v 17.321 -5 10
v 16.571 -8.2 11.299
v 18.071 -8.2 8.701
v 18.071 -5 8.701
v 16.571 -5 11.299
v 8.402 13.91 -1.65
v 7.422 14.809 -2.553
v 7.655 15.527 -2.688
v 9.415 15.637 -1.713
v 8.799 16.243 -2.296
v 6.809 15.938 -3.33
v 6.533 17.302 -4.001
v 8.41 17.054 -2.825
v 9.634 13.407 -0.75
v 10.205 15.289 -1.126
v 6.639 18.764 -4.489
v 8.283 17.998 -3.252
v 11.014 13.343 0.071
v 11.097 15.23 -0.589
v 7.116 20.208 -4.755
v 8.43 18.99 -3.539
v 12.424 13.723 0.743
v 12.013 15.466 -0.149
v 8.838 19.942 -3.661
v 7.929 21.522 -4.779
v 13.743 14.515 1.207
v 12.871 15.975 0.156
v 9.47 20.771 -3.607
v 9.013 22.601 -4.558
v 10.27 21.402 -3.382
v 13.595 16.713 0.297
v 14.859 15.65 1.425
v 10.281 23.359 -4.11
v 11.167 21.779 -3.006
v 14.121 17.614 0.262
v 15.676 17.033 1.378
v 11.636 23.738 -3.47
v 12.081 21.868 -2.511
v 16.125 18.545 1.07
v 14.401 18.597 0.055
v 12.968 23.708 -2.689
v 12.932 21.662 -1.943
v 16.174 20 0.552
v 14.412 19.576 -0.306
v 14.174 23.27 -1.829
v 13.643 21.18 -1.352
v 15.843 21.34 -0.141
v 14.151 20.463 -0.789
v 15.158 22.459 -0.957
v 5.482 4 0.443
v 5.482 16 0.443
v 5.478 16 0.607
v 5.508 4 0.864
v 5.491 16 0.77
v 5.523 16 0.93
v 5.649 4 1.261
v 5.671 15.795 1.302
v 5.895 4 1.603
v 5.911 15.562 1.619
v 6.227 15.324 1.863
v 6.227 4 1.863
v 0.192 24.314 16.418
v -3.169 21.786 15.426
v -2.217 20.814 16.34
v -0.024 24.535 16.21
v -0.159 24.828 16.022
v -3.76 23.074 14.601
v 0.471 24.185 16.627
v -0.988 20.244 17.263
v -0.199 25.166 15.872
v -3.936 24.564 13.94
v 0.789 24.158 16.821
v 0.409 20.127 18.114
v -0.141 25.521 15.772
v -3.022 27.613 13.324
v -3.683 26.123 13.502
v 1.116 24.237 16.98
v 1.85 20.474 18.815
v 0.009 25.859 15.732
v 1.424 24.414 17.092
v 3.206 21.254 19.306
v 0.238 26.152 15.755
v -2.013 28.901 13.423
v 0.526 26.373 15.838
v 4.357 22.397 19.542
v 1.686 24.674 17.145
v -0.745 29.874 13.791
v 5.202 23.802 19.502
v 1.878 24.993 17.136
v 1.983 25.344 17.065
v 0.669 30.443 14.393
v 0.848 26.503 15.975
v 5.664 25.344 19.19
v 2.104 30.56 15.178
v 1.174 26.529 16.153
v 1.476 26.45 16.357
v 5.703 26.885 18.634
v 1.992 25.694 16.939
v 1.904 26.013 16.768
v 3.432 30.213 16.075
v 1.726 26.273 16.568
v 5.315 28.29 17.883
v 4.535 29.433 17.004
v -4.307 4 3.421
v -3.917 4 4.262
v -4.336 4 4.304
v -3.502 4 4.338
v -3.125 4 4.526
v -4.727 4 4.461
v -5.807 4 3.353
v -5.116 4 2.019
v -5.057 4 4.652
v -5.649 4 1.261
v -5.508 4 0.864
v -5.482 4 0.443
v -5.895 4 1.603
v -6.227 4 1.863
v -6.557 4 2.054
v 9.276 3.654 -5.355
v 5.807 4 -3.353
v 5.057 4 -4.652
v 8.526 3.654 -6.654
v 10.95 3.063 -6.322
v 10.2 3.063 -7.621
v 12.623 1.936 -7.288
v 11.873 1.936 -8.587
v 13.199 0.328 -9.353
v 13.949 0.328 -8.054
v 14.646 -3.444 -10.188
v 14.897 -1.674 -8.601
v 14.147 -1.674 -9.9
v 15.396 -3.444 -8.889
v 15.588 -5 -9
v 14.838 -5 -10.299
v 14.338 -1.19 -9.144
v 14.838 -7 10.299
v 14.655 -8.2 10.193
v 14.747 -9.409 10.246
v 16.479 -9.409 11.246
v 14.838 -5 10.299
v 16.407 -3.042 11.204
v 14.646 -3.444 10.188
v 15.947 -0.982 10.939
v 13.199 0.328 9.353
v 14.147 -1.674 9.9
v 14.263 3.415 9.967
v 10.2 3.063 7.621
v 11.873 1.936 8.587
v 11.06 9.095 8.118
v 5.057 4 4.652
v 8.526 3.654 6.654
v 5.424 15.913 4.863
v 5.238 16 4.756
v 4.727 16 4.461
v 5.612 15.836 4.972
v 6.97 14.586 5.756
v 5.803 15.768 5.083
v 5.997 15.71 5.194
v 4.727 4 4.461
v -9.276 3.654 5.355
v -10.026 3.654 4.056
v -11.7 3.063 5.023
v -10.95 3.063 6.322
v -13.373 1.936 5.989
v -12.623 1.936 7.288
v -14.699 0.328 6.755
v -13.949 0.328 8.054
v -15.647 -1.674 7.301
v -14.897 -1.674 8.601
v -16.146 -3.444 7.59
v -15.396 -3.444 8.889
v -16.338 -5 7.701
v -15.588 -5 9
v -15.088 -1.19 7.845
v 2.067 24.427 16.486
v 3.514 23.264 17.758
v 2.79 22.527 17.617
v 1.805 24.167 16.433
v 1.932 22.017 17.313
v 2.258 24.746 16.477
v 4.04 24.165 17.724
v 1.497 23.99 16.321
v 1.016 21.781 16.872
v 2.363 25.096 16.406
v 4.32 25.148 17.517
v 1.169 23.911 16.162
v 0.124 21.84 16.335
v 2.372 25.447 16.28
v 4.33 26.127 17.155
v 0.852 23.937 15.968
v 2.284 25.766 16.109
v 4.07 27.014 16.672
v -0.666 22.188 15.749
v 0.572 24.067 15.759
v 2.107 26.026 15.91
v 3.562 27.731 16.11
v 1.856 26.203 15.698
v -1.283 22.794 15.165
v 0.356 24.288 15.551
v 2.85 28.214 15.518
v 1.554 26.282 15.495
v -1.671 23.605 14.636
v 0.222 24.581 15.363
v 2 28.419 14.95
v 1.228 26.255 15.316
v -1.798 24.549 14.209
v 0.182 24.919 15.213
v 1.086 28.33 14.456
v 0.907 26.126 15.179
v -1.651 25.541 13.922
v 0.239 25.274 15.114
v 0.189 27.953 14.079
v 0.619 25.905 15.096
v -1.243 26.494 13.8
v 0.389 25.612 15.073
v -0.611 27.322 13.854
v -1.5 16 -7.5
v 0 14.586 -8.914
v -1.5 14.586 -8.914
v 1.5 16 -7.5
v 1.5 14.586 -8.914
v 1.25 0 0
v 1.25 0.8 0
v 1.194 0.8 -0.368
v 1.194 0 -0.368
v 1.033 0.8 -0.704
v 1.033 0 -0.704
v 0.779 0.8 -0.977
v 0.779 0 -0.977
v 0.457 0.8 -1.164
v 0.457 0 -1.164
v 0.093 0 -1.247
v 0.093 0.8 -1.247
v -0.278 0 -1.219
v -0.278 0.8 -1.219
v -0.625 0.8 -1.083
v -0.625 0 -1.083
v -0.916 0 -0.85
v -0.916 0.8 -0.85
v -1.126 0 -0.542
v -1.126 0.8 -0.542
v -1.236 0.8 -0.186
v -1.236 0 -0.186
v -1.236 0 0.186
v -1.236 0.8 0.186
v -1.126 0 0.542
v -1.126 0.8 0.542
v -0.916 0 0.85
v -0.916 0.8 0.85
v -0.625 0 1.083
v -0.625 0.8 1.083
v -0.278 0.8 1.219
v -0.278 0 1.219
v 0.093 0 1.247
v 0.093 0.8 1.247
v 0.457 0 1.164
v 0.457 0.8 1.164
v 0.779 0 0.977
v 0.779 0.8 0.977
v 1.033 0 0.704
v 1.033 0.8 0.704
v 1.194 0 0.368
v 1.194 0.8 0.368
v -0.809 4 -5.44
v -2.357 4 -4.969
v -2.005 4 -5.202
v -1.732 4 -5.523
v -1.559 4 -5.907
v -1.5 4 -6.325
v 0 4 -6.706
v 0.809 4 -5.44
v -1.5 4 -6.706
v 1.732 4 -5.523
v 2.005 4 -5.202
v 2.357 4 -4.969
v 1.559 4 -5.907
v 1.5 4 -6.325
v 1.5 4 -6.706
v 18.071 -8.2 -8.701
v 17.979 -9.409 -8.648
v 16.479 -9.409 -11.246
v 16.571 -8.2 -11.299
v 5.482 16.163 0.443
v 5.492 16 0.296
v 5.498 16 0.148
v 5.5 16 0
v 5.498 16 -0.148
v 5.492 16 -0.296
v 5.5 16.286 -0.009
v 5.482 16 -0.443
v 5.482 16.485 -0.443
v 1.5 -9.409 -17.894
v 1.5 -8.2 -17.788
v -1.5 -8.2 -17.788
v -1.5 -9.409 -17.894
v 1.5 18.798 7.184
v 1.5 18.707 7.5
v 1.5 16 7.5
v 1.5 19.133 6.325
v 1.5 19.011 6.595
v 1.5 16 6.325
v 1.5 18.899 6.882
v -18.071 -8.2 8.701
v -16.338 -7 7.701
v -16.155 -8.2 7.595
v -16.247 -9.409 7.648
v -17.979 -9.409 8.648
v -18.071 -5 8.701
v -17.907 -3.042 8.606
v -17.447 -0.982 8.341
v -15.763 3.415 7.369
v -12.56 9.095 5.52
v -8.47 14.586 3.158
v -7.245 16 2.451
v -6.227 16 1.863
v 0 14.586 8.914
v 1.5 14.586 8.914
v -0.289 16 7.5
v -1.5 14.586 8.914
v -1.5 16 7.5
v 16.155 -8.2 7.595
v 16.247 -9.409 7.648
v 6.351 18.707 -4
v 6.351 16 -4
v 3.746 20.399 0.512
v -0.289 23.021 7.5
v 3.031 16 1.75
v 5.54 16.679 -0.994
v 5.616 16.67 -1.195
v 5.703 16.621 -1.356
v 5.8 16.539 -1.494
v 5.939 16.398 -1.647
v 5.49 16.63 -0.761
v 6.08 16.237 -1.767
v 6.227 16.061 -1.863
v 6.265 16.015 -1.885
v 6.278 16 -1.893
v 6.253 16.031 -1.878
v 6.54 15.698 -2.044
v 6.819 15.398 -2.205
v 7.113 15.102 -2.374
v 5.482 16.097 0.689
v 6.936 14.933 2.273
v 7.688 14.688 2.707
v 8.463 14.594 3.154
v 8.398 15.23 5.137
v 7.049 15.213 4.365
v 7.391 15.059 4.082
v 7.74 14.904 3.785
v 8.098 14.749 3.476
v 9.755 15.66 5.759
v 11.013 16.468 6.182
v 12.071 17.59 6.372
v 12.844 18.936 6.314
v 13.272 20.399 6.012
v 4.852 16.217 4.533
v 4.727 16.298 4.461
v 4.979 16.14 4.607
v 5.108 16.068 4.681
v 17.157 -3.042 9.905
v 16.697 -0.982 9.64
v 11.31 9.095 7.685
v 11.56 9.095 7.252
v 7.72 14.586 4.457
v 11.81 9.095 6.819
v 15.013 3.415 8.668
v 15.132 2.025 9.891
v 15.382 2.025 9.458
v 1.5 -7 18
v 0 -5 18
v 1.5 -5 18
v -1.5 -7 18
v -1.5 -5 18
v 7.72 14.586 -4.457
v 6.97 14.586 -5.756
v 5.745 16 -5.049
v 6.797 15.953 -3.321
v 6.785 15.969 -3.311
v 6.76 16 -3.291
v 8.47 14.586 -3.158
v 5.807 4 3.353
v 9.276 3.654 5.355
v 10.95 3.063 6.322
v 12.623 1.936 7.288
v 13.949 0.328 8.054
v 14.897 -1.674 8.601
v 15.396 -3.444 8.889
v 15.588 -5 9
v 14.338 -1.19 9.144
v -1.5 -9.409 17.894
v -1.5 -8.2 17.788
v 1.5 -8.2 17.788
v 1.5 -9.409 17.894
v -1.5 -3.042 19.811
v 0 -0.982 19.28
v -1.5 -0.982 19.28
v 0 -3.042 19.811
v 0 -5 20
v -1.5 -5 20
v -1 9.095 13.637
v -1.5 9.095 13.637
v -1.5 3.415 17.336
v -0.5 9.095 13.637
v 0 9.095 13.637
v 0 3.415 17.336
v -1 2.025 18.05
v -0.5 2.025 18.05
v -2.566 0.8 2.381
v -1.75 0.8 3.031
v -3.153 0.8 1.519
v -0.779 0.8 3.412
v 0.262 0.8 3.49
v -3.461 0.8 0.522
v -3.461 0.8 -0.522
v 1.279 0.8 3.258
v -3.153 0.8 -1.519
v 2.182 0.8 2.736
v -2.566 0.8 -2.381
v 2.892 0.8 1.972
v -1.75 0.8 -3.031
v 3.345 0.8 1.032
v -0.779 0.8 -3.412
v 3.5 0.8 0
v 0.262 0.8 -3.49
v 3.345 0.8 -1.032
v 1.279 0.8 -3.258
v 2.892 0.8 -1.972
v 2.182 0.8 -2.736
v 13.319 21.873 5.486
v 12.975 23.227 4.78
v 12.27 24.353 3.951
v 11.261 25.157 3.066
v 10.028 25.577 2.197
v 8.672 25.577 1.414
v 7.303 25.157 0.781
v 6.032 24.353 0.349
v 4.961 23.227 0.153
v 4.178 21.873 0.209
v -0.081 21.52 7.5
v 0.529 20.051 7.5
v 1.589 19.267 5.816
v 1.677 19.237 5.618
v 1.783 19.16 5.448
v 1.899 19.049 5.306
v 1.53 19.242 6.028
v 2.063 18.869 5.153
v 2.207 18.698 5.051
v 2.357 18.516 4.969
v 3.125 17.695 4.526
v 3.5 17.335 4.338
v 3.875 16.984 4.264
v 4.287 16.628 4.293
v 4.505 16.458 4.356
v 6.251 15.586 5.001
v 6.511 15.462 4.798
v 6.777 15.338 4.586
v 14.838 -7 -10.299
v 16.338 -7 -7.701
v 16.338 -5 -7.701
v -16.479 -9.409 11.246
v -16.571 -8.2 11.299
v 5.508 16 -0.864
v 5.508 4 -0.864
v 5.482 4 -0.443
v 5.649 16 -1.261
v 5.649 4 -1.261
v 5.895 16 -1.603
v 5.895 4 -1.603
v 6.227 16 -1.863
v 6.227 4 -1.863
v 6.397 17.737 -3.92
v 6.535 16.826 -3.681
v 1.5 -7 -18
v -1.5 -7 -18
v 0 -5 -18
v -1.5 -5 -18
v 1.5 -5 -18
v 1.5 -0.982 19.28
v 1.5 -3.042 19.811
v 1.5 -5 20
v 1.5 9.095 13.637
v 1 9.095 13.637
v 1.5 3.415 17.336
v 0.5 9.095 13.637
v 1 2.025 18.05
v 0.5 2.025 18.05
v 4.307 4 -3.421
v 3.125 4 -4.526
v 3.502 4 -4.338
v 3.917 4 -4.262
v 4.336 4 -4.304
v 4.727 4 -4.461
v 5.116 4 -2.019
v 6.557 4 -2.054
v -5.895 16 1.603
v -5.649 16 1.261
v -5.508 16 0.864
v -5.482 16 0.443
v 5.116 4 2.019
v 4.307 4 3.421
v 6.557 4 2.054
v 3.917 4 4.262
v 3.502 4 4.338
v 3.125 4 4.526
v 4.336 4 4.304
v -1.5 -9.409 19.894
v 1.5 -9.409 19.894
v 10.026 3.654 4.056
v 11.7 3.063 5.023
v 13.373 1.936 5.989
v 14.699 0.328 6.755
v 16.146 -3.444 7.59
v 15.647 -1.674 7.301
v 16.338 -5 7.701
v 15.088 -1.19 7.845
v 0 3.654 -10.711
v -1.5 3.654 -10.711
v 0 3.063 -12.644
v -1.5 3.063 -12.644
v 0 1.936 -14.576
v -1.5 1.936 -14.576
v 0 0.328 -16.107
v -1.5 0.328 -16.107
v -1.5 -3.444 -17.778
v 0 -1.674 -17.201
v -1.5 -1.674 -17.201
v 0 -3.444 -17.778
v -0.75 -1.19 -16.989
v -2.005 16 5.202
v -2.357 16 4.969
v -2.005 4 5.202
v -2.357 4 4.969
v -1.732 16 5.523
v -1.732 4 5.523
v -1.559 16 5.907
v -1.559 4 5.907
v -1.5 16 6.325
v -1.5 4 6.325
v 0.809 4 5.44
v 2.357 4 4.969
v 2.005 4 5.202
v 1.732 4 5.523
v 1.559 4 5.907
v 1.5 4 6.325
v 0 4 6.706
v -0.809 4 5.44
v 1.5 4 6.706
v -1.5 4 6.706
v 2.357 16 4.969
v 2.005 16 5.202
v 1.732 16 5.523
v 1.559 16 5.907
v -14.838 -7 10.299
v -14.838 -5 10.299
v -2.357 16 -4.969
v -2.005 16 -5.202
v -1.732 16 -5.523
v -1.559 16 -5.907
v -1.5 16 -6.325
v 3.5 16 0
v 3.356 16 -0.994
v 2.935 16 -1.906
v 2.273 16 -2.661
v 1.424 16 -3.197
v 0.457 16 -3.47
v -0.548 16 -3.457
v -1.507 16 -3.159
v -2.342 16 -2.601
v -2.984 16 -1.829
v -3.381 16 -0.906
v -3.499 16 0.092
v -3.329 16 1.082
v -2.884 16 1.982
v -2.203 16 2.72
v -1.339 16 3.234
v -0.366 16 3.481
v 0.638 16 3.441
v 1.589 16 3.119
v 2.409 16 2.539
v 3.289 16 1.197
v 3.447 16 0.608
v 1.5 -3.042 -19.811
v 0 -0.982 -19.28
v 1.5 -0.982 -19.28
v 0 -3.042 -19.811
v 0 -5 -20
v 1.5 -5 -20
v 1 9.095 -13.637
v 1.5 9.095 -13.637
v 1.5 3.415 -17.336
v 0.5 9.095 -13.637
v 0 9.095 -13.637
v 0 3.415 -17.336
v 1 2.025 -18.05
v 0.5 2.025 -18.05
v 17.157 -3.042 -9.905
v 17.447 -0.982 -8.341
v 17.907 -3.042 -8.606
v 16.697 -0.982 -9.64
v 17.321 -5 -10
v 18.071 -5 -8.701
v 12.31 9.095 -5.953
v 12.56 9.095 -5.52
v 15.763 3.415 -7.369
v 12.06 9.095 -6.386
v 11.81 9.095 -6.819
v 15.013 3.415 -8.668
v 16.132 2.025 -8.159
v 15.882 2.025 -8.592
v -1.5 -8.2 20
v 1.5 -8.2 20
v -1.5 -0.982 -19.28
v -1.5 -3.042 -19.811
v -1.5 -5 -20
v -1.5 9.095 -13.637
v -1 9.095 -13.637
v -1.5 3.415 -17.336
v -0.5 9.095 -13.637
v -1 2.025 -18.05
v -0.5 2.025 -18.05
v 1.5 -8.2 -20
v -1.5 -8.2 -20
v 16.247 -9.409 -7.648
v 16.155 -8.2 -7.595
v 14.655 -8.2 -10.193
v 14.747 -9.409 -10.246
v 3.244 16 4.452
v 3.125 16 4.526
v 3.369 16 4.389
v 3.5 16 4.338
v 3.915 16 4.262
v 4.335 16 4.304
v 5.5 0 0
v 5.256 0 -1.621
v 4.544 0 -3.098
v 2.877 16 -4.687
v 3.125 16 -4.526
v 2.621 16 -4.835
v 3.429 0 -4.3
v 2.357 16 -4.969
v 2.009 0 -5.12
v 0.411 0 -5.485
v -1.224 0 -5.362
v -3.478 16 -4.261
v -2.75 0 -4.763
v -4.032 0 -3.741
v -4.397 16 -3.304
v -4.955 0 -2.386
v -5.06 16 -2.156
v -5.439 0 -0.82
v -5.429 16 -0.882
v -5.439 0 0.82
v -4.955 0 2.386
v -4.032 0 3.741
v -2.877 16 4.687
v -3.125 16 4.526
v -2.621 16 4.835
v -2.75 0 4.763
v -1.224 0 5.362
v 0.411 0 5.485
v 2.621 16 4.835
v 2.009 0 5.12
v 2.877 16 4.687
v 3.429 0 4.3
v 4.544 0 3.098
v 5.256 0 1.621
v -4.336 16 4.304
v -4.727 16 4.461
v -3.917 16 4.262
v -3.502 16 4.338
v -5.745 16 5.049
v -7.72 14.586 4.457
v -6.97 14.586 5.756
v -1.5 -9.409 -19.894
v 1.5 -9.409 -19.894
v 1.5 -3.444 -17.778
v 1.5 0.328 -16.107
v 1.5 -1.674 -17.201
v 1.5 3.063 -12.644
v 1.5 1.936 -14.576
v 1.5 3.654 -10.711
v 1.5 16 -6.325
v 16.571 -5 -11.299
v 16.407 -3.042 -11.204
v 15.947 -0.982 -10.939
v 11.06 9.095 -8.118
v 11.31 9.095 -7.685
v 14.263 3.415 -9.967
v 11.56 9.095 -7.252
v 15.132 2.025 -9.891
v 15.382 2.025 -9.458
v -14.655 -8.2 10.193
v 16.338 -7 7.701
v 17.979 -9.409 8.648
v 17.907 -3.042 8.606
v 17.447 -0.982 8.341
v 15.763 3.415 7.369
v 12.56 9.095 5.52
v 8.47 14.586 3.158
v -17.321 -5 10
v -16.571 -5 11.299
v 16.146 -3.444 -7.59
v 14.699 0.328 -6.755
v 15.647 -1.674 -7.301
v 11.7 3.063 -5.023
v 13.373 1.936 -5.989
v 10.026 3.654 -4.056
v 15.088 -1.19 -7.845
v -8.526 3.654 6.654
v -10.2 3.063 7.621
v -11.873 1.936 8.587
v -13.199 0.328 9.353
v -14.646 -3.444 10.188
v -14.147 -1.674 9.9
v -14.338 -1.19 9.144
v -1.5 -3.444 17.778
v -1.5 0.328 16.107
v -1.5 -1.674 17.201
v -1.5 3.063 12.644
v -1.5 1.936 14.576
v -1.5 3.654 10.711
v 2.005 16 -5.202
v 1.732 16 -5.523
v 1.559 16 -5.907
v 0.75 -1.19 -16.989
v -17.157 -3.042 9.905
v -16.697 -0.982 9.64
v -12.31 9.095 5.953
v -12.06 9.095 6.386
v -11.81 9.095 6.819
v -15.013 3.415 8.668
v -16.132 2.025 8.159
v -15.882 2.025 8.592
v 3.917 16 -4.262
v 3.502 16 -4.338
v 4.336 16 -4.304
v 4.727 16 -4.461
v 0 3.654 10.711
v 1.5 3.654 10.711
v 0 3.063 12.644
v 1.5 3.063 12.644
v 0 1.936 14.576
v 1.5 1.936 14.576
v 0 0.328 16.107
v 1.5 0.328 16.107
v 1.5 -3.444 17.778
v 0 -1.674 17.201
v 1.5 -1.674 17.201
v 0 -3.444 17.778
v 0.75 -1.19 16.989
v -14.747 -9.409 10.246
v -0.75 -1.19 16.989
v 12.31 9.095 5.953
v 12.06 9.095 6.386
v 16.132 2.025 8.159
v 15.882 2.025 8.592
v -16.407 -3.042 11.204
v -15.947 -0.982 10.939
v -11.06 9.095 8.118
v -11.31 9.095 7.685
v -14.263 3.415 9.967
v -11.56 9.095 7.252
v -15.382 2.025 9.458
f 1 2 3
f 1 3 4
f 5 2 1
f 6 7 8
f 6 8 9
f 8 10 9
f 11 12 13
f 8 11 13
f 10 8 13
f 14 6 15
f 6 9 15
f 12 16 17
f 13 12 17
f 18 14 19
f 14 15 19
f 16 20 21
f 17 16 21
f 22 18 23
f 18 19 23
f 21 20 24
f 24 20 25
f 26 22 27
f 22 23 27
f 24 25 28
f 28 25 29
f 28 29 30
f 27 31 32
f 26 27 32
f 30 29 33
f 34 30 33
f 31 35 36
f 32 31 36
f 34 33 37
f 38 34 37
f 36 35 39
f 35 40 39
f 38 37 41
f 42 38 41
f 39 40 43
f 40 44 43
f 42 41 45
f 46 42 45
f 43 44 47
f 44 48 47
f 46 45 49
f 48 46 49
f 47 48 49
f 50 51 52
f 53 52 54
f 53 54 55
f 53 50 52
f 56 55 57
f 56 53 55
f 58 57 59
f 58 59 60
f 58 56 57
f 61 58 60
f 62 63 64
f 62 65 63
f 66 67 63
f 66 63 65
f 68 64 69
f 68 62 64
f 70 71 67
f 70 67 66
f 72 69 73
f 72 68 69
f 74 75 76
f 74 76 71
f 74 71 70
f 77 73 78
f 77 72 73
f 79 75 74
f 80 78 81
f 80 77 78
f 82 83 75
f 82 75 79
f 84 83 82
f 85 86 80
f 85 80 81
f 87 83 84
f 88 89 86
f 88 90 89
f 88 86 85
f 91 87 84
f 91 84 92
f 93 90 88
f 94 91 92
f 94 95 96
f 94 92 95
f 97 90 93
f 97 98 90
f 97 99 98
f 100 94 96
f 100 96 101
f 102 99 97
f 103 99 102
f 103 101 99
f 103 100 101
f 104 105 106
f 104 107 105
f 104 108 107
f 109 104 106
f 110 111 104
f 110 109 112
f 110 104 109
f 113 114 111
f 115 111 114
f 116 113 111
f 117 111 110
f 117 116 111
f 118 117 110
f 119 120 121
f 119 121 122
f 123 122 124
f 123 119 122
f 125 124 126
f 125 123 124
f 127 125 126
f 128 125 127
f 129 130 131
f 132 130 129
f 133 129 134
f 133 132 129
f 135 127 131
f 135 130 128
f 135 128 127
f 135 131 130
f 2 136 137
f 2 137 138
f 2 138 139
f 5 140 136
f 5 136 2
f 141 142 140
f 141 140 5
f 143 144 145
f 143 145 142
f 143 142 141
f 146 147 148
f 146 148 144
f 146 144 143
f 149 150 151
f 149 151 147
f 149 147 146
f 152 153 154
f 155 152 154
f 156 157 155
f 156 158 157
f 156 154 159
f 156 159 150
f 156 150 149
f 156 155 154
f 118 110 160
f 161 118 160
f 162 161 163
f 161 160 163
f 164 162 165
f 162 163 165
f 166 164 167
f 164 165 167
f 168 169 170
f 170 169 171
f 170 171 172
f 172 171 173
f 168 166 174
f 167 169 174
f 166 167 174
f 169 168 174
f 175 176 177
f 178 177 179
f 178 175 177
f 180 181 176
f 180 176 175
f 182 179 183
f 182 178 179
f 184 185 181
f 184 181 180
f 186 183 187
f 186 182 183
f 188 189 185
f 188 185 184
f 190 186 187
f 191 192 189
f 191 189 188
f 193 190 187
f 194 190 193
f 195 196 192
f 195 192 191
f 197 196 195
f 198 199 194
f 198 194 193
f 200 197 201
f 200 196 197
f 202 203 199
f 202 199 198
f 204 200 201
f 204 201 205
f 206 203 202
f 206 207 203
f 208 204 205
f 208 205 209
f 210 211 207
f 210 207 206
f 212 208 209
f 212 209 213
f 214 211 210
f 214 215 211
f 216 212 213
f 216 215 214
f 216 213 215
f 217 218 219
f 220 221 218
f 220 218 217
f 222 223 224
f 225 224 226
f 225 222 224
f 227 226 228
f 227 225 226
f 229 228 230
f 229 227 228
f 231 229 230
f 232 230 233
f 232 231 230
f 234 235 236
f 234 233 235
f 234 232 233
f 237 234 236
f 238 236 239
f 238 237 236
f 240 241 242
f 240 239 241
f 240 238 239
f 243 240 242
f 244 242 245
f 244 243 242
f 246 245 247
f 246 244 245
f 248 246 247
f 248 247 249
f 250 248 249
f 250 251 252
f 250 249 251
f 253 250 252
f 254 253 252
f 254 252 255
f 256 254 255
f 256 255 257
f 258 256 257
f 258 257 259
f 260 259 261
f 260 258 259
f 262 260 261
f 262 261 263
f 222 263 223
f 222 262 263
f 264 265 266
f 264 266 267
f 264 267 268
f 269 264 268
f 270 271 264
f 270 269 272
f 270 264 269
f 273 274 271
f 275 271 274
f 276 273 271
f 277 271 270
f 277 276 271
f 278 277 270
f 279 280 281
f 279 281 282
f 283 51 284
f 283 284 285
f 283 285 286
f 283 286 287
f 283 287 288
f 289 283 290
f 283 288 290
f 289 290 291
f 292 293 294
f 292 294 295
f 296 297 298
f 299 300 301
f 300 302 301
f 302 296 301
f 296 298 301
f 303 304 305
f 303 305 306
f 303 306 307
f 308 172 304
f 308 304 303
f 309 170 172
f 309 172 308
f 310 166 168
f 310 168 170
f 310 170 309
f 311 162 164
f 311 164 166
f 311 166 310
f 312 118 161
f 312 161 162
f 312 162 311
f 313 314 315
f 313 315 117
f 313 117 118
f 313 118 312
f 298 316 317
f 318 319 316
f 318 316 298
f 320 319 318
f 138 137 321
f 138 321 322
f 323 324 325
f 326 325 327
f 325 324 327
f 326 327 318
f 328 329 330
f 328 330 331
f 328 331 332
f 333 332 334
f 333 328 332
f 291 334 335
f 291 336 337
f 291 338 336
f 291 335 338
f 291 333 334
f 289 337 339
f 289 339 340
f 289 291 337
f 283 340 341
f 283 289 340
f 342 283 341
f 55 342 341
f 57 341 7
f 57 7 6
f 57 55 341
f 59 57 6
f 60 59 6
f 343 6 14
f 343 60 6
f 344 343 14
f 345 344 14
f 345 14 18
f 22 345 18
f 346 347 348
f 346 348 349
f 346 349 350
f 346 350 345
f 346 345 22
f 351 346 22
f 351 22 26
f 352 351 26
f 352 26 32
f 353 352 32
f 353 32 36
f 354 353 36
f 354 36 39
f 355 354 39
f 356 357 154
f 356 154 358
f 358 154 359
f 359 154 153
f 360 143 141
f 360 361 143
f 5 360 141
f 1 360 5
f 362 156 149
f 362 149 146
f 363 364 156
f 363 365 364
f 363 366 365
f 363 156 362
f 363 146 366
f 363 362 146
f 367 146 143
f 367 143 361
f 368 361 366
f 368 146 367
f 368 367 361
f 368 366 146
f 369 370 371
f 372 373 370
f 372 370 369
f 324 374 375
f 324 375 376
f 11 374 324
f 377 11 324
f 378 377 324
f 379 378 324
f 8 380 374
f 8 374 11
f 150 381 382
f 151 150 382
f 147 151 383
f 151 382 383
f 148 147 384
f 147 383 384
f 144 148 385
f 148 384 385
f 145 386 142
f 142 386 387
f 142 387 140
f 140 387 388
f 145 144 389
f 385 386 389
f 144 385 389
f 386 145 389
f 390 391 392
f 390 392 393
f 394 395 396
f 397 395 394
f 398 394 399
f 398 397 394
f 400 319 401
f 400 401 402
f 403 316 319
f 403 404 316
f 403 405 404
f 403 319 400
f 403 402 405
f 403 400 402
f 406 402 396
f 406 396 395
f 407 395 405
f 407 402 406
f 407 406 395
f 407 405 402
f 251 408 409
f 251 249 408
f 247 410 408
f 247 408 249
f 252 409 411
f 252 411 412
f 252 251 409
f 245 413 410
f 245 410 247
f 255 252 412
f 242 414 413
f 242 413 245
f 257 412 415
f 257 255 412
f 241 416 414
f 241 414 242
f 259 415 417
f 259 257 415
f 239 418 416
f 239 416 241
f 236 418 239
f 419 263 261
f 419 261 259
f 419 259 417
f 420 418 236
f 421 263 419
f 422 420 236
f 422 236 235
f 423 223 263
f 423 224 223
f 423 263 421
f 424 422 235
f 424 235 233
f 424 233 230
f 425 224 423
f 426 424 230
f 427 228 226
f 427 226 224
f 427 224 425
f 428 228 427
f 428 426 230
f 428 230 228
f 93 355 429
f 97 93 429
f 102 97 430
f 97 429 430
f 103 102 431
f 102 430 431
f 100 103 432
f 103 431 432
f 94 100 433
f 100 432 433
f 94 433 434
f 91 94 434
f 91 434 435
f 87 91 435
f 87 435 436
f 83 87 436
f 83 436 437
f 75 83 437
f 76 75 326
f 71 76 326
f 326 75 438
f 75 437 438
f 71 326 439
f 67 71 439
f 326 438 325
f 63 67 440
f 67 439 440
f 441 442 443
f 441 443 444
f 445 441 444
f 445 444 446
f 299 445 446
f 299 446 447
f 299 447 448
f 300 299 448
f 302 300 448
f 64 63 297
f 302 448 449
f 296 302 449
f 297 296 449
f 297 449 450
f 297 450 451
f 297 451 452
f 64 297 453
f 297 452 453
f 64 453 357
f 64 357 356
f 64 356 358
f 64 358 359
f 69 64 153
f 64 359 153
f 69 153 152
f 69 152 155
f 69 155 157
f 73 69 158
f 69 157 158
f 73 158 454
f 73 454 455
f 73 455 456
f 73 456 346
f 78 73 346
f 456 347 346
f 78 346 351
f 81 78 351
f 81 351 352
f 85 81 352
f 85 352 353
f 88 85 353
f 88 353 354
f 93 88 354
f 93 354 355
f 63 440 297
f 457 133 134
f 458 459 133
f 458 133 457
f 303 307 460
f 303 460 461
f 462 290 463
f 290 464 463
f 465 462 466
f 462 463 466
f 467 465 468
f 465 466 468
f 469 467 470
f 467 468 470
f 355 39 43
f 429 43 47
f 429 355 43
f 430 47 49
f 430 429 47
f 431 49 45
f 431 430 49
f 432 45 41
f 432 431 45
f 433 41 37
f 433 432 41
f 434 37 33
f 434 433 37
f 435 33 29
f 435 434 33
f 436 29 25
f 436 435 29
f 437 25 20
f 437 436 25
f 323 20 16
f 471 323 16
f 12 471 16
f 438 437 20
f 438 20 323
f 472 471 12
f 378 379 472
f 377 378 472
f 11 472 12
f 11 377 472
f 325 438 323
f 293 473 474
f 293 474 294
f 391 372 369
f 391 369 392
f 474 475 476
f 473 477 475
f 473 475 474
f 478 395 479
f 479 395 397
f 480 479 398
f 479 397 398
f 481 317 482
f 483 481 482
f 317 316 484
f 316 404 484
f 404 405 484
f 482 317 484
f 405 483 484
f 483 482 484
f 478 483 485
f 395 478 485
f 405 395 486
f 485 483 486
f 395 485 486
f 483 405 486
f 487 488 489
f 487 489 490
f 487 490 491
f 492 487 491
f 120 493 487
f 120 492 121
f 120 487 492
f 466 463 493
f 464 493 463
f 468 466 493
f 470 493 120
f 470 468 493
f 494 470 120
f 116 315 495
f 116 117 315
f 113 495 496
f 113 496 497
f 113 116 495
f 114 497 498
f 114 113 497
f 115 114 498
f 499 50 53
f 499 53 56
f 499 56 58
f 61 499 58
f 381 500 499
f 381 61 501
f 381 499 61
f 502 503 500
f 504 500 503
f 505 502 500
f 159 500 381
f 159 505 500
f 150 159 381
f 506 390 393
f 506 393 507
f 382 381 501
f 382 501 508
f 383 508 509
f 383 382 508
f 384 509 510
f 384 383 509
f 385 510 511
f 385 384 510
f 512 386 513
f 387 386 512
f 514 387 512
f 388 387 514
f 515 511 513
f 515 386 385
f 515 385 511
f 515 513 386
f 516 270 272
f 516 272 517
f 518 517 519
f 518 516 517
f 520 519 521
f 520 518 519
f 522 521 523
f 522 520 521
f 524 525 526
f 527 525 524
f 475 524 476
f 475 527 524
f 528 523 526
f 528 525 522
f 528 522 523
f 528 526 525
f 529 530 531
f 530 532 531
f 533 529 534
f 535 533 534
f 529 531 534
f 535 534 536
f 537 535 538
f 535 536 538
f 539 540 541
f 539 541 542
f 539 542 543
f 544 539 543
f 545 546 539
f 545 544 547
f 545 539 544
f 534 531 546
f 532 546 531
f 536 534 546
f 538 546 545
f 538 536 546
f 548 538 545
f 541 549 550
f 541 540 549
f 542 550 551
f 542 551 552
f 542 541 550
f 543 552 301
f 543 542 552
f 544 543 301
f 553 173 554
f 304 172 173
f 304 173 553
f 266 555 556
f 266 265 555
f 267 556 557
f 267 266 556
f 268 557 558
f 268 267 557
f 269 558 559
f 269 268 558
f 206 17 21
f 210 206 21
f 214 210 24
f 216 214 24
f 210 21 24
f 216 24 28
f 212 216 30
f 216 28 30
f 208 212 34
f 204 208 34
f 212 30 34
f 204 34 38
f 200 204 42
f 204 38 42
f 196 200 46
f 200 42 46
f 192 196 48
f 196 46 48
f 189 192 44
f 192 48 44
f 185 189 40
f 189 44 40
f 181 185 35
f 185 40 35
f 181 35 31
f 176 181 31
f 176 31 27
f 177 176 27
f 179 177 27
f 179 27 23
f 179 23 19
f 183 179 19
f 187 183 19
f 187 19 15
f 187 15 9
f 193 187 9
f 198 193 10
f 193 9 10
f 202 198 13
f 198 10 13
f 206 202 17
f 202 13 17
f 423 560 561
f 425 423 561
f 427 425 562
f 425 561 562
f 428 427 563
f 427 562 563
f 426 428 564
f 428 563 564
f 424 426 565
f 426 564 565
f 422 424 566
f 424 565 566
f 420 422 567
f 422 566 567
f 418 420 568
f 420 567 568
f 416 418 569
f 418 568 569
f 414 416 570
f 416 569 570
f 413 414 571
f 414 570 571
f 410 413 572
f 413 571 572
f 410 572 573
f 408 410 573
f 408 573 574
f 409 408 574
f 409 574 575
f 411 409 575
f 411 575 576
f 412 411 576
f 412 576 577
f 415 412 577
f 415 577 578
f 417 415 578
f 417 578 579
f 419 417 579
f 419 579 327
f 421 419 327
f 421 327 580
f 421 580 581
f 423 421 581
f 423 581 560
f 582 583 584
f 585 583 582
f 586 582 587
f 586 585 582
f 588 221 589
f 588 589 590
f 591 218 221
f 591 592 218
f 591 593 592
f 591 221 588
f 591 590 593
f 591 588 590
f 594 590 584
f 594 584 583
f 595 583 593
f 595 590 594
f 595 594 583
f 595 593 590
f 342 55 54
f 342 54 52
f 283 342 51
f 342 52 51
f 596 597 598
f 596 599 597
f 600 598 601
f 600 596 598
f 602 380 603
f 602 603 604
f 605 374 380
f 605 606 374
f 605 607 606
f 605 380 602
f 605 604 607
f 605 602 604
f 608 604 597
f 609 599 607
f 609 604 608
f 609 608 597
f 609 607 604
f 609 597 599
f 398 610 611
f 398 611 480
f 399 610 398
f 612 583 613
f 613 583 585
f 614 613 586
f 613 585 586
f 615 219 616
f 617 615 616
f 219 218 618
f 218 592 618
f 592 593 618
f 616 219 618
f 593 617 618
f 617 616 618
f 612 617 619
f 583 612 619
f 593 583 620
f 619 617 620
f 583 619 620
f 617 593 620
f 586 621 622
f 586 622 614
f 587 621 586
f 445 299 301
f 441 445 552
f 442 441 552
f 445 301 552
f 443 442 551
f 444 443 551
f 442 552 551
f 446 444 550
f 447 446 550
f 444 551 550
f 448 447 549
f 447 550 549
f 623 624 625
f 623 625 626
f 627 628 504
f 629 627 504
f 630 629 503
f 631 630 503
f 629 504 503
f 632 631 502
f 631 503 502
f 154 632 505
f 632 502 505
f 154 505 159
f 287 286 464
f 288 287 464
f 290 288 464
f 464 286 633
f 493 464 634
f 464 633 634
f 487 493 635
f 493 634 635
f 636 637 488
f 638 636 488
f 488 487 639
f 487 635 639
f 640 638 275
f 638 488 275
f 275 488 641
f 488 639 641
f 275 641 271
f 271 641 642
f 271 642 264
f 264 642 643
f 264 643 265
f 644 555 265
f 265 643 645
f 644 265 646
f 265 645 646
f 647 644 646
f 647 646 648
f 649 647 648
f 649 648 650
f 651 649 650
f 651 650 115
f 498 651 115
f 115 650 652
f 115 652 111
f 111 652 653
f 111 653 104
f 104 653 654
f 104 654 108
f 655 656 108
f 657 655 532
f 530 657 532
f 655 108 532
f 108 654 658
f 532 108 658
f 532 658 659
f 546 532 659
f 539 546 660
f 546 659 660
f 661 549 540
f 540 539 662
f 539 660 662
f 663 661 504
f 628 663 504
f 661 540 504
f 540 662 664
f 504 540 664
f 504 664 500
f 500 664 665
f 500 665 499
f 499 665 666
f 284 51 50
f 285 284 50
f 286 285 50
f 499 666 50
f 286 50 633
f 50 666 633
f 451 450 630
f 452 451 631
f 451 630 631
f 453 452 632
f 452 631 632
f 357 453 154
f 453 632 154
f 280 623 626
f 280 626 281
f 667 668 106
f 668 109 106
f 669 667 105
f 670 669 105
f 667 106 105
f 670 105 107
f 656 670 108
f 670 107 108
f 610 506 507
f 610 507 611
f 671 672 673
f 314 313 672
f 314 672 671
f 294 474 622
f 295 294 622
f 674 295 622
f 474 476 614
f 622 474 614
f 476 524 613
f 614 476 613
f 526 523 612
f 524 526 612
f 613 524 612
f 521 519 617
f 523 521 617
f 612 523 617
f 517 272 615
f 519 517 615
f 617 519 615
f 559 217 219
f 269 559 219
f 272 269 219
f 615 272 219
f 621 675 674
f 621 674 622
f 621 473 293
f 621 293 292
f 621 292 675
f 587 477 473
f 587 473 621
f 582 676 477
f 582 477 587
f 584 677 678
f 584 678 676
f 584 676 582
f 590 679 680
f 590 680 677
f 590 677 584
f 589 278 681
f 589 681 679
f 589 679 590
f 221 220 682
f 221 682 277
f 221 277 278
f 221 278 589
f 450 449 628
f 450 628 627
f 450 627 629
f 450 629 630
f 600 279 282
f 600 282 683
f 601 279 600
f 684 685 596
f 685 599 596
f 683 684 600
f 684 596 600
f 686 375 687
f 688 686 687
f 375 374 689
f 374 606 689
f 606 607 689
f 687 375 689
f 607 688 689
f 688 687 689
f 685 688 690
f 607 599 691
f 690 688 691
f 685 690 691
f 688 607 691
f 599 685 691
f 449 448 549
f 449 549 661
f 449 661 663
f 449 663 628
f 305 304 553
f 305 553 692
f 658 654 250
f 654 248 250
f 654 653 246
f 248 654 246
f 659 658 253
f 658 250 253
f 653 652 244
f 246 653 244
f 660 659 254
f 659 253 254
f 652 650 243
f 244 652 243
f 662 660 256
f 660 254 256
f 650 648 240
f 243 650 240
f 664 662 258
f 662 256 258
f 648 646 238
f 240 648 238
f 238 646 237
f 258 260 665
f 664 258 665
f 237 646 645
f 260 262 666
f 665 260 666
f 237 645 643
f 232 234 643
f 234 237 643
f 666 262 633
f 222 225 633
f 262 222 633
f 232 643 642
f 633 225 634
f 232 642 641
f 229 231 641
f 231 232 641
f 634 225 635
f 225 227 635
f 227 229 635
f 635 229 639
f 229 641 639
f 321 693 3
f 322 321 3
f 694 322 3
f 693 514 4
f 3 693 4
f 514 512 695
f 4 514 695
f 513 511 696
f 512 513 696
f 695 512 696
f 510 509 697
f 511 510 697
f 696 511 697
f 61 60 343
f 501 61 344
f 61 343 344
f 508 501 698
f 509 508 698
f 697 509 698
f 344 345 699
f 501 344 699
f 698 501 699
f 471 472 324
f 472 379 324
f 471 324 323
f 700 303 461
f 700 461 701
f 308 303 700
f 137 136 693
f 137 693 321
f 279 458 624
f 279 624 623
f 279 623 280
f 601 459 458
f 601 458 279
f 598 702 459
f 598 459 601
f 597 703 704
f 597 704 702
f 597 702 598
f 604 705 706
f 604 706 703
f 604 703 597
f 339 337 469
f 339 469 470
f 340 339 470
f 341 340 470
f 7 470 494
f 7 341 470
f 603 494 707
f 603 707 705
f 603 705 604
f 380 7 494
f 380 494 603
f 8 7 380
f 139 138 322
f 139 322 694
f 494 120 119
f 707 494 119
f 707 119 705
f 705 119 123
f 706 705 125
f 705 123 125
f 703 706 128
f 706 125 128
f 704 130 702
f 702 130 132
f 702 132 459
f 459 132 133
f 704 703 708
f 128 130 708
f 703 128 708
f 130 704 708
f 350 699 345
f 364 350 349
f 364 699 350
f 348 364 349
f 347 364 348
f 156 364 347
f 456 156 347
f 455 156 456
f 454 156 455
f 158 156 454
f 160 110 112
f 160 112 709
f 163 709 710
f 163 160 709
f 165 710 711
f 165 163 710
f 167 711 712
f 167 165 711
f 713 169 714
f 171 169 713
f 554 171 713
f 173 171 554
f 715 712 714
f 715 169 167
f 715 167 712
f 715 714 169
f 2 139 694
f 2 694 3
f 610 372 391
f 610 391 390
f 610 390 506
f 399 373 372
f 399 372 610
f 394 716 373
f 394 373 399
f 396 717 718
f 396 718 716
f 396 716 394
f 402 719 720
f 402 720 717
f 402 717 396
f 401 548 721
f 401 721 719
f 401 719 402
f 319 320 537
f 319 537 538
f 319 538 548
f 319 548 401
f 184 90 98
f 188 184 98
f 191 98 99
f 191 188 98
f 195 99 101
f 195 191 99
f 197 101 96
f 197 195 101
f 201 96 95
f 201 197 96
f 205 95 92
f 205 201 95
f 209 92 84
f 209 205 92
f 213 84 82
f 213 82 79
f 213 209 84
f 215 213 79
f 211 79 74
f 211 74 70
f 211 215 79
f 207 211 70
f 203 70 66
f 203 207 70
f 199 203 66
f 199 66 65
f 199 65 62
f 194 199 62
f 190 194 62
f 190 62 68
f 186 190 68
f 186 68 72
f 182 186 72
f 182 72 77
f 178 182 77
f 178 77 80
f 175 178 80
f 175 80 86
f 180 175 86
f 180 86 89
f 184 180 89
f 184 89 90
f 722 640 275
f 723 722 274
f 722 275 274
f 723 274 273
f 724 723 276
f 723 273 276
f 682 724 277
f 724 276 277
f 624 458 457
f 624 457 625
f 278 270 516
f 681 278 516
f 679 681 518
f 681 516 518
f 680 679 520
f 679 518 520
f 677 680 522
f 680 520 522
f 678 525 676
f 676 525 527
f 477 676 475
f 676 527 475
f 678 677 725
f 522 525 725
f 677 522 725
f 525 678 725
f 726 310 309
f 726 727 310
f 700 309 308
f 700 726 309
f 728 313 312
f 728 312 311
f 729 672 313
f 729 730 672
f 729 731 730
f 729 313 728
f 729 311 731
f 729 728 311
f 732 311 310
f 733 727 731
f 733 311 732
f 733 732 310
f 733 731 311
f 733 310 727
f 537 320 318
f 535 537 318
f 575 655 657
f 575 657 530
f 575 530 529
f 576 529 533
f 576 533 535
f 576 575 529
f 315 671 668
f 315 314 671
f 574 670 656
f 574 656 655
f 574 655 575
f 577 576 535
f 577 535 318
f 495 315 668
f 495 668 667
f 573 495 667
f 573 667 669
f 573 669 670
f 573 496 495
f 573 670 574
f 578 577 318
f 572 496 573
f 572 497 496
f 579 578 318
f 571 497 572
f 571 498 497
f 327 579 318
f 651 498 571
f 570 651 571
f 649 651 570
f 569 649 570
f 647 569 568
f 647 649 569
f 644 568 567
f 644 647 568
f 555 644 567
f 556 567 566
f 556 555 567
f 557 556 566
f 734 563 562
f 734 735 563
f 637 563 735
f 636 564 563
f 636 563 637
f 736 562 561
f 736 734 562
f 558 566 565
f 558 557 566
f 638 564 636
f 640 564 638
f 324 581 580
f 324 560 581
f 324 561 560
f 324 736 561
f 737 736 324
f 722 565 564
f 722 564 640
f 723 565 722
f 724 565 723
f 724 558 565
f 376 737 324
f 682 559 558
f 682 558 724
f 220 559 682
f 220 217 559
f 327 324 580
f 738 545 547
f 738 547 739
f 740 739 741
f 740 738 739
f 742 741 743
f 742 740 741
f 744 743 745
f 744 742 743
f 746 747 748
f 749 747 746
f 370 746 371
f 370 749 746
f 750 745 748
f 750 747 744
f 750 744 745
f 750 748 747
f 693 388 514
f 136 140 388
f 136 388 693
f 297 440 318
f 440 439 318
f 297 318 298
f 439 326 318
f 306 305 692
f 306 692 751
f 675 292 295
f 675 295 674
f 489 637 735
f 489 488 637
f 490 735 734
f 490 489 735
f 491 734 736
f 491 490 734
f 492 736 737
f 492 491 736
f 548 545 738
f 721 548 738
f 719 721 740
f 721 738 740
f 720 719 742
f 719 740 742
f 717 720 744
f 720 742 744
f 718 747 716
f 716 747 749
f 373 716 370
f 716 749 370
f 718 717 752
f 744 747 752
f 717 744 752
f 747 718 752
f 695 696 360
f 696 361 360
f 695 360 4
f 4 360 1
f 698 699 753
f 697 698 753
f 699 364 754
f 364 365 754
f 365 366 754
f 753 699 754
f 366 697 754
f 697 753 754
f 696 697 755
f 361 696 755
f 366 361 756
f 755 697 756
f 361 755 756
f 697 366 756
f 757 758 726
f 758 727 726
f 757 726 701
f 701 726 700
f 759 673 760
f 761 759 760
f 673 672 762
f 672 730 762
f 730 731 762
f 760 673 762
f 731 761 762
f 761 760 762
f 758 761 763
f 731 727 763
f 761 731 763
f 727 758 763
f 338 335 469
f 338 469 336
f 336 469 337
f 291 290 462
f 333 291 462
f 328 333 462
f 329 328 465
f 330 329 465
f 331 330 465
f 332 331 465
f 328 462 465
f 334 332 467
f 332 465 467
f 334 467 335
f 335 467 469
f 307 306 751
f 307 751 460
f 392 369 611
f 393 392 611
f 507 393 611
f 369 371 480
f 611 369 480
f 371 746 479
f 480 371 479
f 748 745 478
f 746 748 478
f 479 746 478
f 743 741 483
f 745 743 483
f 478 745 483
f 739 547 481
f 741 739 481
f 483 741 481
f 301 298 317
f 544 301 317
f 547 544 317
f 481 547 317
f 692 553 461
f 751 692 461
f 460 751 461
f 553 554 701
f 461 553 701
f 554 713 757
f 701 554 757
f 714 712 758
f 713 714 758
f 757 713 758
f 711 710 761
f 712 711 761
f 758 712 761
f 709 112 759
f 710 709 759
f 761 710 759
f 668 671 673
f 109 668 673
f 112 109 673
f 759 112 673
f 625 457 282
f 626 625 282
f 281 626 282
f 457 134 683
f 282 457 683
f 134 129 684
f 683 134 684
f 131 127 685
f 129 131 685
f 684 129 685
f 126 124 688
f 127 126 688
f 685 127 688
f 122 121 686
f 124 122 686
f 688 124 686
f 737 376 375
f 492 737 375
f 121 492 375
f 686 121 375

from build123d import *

# Parameters (mm, degrees)
SKETCH1_R                = 5.5
SKETCH1_R_2              = 1.25
BOSS_EXTRUDE1_DEPTH      = 16
BOSS_EXTRUDE2_DEPTH      = 1.5
BOSS_EXTRUDE3_DEPTH      = 3
CIRPATTERN1_COUNT        = 5
CIRPATTERN1_ANGLE        = 240
FILLET1_R                = 1.5
SKETCH6_R                = 3.5
CUT_EXTRUDE1_DEPTH       = 15.2
SKETCH10_R               = 5.5
SKETCH10_R_2             = 1.25
BOSS_EXTRUDE4_DEPTH      = 16
BOSS_EXTRUDE4_DEPTH_BACK = 6
BOSS_EXTRUDE10_REACH     = 16.574
SKETCH11_R               = 3.5
CUT_EXTRUDE2_DEPTH       = 21.2


with BuildPart() as part:
    # Sketch1 → Boss-Extrude1 (new body)
    with BuildSketch(Plane(origin=(0, 0, 0), x_dir=(1, 0, 0), z_dir=(0, 1, 0))):
        Circle(SKETCH1_R)
        Circle(SKETCH1_R_2, mode=Mode.SUBTRACT)
    extrude(amount=BOSS_EXTRUDE1_DEPTH)

    # Sketch2 → Boss-Extrude2 (add, symmetric)
    with BuildSketch(Plane(origin=(0, 0, 0), x_dir=(0, 0, -1), z_dir=(1, 0, 0))):
        with BuildLine():
            Line((18, -5), (20, -5))
            add(Edge.make_bspline(
                [(8.914213562, 14.585786438), (13.074333826, 10.425666174), (20, 1.461761402), (20, -5)],
                knots=[0.14734609, 0.14734609, 0.14734609, 0.14734609, 1, 1, 1, 1], degree=3))
            Line((8.914213562, 14.585786438), (7.5, 16))
            Line((7.5, 16), (5.5, 16))
            Line((5.5, 16), (1.25, 16))
            Line((1.25, 16), (1.25, 4))
            Line((1.25, 4), (6.70571865, 4))
            add(Edge.make_bspline(
                [(6.70571865, 4), (10.522194615, 4), (16.021169224, 3.257262603), (18, -4.005650027), (18, -5)],
                knots=[0, 0, 0, 0, 0.785490543, 1, 1, 1, 1], degree=3))
        make_face()
    boss_extrude2 = extrude(amount=BOSS_EXTRUDE2_DEPTH, both=True)

    # Sketch8 → Boss-Extrude3 (add)
    with BuildSketch(Plane(origin=(1.5, 0, 0), x_dir=(0, 0, -1), z_dir=(1, 0, 0))):
        Polygon((18, -7), (17.788407623, -8.2), (17.894203812, -9.409255967), (19.894203812, -9.409255967), (20, -8.2), (20, -7), (20, -5), (18, -5), align=None)
    boss_extrude3 = extrude(amount=-BOSS_EXTRUDE3_DEPTH)

    # CirPattern1: Boss-Extrude2, Boss-Extrude3 ×5 about axis
    cirpattern1_axis = Axis((0, 16, 0), (0, -1, 0))
    for i in range(1, CIRPATTERN1_COUNT):
        add(boss_extrude2.rotate(cirpattern1_axis, i * CIRPATTERN1_ANGLE / (CIRPATTERN1_COUNT - 1)))
        add(boss_extrude3.rotate(cirpattern1_axis, i * CIRPATTERN1_ANGLE / (CIRPATTERN1_COUNT - 1)))

    # Fillet1
    fillet1_edges = [part.edges().sort_by_distance(p)[0] for p in [
        (-5.332575695, 10, 1.346713205),
        (1.5, 10, -5.291502622),
        (-1.5, 10, -5.291502622),
        (3.832575695, 10, -3.944789417),
        (5.332575695, 10, 1.346713205),
        (1.5, 10, 5.291502622),
        (-3.832575695, 10, 3.944789417),
        (5.332575695, 10, -1.346713205),
        (3.832575695, 10, 3.944789417),
        (-1.5, 10, 5.291502622),
    ]]
    fillet(fillet1_edges, radius=FILLET1_R)

    # Sketch6 → Cut-Extrude1 (cut)
    with BuildSketch(Plane(origin=(0, 16, 0), x_dir=(1, 0, 0), z_dir=(0, 1, 0))):
        Circle(SKETCH6_R)
    extrude(amount=-CUT_EXTRUDE1_DEPTH, mode=Mode.SUBTRACT)

    # Sketch10 → Boss-Extrude4 (add, two sides)
    with BuildSketch(Plane(origin=(-2.351141009, 1.527864045, 4.072295684), x_dir=(0.866025404, 0, 0.5), z_dir=(-0.475528258, 0.309016994, 0.823639104))) as boss_extrude4_sk:
        with Locations((9, 19.842637557)):
            Circle(SKETCH10_R)
        with Locations((9, 19.842637557)):
            Circle(SKETCH10_R_2, mode=Mode.SUBTRACT)
    extrude(amount=BOSS_EXTRUDE4_DEPTH)
    extrude(boss_extrude4_sk.sketch, amount=-BOSS_EXTRUDE4_DEPTH_BACK)

    # Sketch16 → Boss-Extrude10 (add, up to next)
    with BuildSketch(Plane(origin=(0, 16, 0), x_dir=(1, 0, 0), z_dir=(0, 1, 0)), mode=Mode.PRIVATE) as boss_extrude10_sk1:
        with BuildLine():
            Line((6.350852961, 4), (-0.288675135, -7.5))
            Line((-0.288675135, -7.5), (1.5, -7.5))
            Line((1.5, -7.5), (1.5, -6.32455532))
            ThreePointArc((1.5, -6.32455532), (1.732268618, -5.522771595), (2.357142857, -4.969293466))
            ThreePointArc((2.357142857, -4.969293466), (2.75, -4.763139721), (3.124962952, -4.525992328))
            ThreePointArc((3.124962952, -4.525992328), (3.305889272, -4.418971164), (3.5, -4.338293482))
            ThreePointArc((3.5, -4.338293482), (4.126842059, -4.267834221), (4.727225575, -4.461315766))
            Line((4.727225575, -4.461315766), (5.23810468, -4.756271954))
            add(Edge.make_bspline(
                [(5.522613217, -0.930402058), (5.049152923, -3.22167428), (5.23810468, -4.756271954)],
                knots=[5.532424046, 5.532424046, 5.532424046, 5.894267037, 5.894267037, 5.894267037], degree=2, weights=[1, 0.9836783, 1]))
            ThreePointArc((5.522613217, -0.930402058), (5.482385541, -0.688512638), (5.482105809, -0.443301138))
            ThreePointArc((5.482105809, -0.443301138), (5.5, 0), (5.482105809, 0.443301138))
            ThreePointArc((5.482105809, 0.443301138), (5.648994809, 1.261197168), (6.227225575, 1.863239554))
            Line((6.227225575, 1.863239554), (6.278306217, 1.892730977))
            add(Edge.make_bspline(
                [(6.759951788, 3.291420046), (6.498738058, 2.578407465), (6.278306217, 1.892730977)],
                knots=[5.225610557, 5.225610557, 5.225610557, 5.322030654, 5.322030654, 5.322030654], degree=2, weights=[1, 0.998838121, 1]))
            Line((6.759951788, 3.291420046), (6.350852961, 4))
        make_face()
    boss_extrude10_tool1 = extrude(boss_extrude10_sk1.sketch, amount=BOSS_EXTRUDE10_REACH, mode=Mode.PRIVATE) - part.part
    add(boss_extrude10_tool1.solids().sort_by_distance((3.702235, 16, 2.406075))[0])

    # Sketch11 → Cut-Extrude2 (cut)
    with BuildSketch(Plane(origin=(0.50202854, -0.326237921, -0.869538938), x_dir=(-0.879643998, -0.156424143, -0.449174715), z_dir=(0.475528258, -0.309016994, -0.823639104))):
        with Locations((-12.14103215, 18.092142039)):
            Circle(SKETCH11_R)
    extrude(amount=-CUT_EXTRUDE2_DEPTH, mode=Mode.SUBTRACT)


solid = part.part
